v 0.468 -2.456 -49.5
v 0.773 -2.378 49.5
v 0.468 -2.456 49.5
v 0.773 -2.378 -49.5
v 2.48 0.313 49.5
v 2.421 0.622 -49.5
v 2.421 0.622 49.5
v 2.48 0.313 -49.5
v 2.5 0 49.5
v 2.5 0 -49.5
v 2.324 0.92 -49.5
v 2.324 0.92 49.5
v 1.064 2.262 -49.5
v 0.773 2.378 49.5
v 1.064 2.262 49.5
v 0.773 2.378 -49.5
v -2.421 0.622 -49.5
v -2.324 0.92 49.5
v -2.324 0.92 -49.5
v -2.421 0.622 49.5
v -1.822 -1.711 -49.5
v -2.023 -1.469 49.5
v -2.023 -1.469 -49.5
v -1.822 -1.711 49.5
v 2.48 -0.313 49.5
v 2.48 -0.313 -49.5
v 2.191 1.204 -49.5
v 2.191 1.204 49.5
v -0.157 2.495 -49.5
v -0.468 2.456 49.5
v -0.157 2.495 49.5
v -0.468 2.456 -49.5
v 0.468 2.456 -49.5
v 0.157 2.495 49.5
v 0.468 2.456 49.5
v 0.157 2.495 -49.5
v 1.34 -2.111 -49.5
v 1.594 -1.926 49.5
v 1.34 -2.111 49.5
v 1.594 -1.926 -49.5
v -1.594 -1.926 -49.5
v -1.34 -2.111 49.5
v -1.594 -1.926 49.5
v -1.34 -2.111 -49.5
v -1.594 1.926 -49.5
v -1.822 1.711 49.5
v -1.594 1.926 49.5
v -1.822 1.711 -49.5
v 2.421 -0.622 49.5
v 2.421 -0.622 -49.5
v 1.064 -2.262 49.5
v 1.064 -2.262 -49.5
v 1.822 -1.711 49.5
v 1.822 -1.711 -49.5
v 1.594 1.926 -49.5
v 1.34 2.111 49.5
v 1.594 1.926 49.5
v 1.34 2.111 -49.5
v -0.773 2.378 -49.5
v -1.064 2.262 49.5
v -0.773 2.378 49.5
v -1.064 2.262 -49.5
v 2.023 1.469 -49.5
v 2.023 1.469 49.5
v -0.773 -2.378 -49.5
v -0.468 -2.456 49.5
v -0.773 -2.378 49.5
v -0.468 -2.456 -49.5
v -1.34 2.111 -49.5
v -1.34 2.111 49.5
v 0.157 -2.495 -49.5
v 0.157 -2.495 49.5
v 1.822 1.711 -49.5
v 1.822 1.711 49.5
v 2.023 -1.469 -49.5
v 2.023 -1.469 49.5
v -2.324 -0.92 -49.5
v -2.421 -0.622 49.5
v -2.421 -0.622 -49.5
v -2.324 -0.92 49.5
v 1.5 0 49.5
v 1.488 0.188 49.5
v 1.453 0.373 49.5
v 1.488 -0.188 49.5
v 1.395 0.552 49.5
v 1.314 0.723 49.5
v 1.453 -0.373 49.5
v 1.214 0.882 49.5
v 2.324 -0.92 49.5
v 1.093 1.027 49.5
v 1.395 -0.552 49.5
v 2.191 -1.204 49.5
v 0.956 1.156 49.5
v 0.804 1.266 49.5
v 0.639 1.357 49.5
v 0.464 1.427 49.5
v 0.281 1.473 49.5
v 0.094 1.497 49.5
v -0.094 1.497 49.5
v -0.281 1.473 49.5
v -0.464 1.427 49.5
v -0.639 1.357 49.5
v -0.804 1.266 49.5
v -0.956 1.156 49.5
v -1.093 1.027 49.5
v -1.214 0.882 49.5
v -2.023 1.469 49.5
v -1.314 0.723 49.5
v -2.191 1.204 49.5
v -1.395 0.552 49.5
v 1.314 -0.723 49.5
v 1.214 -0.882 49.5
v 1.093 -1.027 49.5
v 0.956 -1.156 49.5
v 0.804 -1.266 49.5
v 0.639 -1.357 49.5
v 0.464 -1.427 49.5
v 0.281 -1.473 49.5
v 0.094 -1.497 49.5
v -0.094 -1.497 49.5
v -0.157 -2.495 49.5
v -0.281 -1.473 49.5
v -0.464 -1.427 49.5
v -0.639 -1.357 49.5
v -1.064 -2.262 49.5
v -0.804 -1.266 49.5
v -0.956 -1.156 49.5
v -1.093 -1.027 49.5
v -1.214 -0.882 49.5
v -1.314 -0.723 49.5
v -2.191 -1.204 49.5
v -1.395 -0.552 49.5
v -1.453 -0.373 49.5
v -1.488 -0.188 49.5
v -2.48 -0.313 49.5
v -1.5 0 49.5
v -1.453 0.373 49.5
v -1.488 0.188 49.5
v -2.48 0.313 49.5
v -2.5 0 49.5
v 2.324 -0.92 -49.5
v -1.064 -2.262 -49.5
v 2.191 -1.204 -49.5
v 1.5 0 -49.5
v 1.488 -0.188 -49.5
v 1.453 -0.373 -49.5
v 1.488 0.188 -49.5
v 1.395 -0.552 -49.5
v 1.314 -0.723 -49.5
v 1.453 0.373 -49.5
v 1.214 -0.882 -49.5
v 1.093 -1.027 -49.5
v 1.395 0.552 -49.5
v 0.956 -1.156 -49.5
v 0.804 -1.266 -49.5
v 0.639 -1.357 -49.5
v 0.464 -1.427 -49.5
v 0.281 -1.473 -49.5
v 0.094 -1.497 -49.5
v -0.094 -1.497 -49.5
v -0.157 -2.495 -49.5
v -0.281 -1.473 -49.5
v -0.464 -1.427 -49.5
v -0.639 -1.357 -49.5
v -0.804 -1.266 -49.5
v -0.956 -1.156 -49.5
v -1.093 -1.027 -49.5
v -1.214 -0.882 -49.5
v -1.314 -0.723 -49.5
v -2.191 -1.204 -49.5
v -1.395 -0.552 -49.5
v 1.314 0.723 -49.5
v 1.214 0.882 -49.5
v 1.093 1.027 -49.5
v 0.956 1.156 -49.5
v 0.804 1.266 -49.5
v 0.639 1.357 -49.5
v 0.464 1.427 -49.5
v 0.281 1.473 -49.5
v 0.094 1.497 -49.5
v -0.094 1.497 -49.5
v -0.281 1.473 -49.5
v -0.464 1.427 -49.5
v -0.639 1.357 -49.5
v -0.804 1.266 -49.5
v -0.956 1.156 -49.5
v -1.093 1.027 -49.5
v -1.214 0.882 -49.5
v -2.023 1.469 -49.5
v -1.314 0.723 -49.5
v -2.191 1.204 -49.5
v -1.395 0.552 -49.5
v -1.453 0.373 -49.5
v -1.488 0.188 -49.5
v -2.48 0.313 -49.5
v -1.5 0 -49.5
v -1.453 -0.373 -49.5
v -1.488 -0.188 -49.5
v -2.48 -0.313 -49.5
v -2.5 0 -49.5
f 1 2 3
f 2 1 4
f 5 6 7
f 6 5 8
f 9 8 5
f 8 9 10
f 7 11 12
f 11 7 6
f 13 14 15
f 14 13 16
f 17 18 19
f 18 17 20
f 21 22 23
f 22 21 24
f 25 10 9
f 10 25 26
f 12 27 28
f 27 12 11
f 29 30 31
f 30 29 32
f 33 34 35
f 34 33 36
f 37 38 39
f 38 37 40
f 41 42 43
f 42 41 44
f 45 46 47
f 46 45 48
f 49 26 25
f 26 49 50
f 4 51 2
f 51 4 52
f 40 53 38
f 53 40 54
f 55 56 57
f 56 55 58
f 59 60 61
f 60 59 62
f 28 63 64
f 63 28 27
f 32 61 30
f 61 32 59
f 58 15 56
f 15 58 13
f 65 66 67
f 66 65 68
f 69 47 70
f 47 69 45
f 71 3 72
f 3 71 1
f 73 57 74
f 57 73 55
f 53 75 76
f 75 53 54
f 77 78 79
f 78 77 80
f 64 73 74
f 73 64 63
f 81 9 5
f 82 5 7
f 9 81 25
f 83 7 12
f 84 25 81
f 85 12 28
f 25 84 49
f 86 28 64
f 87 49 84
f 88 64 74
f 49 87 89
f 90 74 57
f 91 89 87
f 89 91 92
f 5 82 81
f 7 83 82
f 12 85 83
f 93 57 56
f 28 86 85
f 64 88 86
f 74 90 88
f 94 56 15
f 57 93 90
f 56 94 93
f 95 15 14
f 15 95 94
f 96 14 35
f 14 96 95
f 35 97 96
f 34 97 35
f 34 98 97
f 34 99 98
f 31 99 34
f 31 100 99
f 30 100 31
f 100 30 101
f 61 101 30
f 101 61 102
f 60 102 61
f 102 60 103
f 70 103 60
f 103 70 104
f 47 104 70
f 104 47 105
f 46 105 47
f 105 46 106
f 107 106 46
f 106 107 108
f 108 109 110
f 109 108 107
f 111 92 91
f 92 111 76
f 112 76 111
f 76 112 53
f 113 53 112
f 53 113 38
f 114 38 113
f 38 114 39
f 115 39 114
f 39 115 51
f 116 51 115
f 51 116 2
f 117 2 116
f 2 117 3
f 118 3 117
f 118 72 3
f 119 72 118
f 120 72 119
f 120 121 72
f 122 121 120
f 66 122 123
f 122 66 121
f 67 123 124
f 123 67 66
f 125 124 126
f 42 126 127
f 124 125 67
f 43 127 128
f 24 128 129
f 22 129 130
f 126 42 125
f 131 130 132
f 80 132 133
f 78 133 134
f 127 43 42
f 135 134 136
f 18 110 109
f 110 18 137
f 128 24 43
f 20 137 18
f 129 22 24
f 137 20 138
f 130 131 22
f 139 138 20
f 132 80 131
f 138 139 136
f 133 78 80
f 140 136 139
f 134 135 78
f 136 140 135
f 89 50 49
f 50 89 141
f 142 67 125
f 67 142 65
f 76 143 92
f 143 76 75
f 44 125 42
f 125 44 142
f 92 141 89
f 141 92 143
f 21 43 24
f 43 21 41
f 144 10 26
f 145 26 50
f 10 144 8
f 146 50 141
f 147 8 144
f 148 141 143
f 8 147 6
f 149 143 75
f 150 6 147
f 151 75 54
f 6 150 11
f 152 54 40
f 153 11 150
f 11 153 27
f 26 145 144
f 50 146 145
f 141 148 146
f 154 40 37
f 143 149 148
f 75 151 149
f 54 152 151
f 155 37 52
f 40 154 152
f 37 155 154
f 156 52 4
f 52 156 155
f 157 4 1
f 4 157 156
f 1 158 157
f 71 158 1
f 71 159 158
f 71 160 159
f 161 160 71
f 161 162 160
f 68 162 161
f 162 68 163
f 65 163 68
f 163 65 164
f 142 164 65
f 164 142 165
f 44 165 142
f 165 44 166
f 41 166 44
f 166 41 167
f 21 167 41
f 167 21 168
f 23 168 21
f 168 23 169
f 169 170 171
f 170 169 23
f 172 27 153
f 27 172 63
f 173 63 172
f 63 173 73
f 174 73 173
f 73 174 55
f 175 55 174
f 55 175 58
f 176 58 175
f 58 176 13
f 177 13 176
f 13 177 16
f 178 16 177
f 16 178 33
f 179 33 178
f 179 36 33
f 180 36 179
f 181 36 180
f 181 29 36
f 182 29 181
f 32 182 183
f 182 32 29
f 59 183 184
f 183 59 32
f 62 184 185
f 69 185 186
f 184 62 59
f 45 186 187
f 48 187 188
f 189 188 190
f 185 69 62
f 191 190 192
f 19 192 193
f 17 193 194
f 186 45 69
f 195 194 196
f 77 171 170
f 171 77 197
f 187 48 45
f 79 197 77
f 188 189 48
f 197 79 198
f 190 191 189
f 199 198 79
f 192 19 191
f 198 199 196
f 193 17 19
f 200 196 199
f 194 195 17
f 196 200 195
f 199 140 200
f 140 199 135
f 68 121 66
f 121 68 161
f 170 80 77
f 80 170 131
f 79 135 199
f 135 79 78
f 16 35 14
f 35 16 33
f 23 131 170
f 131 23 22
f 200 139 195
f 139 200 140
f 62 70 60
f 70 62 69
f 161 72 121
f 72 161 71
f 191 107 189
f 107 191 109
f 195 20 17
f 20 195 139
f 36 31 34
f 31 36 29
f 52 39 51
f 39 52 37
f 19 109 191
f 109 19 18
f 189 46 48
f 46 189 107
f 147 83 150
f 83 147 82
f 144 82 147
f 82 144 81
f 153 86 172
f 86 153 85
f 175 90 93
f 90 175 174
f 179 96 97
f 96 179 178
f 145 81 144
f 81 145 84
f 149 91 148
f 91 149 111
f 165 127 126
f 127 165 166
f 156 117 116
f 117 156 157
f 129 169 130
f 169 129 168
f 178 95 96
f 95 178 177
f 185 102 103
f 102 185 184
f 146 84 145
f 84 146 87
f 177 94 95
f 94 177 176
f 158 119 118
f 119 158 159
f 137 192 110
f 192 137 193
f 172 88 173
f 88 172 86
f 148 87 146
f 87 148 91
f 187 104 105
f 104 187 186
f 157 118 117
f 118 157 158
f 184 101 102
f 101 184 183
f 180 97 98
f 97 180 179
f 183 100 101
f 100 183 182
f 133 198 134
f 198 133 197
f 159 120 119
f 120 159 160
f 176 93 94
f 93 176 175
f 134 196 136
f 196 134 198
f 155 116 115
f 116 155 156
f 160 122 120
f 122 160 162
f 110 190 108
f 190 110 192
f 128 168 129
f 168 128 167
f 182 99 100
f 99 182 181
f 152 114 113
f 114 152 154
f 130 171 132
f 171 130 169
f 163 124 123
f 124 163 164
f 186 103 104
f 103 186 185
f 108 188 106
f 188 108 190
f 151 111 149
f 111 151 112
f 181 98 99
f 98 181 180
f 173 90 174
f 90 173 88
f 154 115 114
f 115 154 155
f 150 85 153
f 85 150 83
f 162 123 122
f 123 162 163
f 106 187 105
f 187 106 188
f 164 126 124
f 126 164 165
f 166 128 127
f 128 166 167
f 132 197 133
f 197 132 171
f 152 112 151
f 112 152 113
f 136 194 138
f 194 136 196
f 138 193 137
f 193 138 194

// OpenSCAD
$fn = 50;


difference() {
	union() {
		translate(v = [0, 0, -49.5000000000]) {
			cylinder(h = 99, r = 2.5000000000);
		}
	}
	union() {
		translate(v = [0, 0, -100.0000000000]) {
			cylinder(h = 200, r = 1.5000000000);
		}
	}
}
